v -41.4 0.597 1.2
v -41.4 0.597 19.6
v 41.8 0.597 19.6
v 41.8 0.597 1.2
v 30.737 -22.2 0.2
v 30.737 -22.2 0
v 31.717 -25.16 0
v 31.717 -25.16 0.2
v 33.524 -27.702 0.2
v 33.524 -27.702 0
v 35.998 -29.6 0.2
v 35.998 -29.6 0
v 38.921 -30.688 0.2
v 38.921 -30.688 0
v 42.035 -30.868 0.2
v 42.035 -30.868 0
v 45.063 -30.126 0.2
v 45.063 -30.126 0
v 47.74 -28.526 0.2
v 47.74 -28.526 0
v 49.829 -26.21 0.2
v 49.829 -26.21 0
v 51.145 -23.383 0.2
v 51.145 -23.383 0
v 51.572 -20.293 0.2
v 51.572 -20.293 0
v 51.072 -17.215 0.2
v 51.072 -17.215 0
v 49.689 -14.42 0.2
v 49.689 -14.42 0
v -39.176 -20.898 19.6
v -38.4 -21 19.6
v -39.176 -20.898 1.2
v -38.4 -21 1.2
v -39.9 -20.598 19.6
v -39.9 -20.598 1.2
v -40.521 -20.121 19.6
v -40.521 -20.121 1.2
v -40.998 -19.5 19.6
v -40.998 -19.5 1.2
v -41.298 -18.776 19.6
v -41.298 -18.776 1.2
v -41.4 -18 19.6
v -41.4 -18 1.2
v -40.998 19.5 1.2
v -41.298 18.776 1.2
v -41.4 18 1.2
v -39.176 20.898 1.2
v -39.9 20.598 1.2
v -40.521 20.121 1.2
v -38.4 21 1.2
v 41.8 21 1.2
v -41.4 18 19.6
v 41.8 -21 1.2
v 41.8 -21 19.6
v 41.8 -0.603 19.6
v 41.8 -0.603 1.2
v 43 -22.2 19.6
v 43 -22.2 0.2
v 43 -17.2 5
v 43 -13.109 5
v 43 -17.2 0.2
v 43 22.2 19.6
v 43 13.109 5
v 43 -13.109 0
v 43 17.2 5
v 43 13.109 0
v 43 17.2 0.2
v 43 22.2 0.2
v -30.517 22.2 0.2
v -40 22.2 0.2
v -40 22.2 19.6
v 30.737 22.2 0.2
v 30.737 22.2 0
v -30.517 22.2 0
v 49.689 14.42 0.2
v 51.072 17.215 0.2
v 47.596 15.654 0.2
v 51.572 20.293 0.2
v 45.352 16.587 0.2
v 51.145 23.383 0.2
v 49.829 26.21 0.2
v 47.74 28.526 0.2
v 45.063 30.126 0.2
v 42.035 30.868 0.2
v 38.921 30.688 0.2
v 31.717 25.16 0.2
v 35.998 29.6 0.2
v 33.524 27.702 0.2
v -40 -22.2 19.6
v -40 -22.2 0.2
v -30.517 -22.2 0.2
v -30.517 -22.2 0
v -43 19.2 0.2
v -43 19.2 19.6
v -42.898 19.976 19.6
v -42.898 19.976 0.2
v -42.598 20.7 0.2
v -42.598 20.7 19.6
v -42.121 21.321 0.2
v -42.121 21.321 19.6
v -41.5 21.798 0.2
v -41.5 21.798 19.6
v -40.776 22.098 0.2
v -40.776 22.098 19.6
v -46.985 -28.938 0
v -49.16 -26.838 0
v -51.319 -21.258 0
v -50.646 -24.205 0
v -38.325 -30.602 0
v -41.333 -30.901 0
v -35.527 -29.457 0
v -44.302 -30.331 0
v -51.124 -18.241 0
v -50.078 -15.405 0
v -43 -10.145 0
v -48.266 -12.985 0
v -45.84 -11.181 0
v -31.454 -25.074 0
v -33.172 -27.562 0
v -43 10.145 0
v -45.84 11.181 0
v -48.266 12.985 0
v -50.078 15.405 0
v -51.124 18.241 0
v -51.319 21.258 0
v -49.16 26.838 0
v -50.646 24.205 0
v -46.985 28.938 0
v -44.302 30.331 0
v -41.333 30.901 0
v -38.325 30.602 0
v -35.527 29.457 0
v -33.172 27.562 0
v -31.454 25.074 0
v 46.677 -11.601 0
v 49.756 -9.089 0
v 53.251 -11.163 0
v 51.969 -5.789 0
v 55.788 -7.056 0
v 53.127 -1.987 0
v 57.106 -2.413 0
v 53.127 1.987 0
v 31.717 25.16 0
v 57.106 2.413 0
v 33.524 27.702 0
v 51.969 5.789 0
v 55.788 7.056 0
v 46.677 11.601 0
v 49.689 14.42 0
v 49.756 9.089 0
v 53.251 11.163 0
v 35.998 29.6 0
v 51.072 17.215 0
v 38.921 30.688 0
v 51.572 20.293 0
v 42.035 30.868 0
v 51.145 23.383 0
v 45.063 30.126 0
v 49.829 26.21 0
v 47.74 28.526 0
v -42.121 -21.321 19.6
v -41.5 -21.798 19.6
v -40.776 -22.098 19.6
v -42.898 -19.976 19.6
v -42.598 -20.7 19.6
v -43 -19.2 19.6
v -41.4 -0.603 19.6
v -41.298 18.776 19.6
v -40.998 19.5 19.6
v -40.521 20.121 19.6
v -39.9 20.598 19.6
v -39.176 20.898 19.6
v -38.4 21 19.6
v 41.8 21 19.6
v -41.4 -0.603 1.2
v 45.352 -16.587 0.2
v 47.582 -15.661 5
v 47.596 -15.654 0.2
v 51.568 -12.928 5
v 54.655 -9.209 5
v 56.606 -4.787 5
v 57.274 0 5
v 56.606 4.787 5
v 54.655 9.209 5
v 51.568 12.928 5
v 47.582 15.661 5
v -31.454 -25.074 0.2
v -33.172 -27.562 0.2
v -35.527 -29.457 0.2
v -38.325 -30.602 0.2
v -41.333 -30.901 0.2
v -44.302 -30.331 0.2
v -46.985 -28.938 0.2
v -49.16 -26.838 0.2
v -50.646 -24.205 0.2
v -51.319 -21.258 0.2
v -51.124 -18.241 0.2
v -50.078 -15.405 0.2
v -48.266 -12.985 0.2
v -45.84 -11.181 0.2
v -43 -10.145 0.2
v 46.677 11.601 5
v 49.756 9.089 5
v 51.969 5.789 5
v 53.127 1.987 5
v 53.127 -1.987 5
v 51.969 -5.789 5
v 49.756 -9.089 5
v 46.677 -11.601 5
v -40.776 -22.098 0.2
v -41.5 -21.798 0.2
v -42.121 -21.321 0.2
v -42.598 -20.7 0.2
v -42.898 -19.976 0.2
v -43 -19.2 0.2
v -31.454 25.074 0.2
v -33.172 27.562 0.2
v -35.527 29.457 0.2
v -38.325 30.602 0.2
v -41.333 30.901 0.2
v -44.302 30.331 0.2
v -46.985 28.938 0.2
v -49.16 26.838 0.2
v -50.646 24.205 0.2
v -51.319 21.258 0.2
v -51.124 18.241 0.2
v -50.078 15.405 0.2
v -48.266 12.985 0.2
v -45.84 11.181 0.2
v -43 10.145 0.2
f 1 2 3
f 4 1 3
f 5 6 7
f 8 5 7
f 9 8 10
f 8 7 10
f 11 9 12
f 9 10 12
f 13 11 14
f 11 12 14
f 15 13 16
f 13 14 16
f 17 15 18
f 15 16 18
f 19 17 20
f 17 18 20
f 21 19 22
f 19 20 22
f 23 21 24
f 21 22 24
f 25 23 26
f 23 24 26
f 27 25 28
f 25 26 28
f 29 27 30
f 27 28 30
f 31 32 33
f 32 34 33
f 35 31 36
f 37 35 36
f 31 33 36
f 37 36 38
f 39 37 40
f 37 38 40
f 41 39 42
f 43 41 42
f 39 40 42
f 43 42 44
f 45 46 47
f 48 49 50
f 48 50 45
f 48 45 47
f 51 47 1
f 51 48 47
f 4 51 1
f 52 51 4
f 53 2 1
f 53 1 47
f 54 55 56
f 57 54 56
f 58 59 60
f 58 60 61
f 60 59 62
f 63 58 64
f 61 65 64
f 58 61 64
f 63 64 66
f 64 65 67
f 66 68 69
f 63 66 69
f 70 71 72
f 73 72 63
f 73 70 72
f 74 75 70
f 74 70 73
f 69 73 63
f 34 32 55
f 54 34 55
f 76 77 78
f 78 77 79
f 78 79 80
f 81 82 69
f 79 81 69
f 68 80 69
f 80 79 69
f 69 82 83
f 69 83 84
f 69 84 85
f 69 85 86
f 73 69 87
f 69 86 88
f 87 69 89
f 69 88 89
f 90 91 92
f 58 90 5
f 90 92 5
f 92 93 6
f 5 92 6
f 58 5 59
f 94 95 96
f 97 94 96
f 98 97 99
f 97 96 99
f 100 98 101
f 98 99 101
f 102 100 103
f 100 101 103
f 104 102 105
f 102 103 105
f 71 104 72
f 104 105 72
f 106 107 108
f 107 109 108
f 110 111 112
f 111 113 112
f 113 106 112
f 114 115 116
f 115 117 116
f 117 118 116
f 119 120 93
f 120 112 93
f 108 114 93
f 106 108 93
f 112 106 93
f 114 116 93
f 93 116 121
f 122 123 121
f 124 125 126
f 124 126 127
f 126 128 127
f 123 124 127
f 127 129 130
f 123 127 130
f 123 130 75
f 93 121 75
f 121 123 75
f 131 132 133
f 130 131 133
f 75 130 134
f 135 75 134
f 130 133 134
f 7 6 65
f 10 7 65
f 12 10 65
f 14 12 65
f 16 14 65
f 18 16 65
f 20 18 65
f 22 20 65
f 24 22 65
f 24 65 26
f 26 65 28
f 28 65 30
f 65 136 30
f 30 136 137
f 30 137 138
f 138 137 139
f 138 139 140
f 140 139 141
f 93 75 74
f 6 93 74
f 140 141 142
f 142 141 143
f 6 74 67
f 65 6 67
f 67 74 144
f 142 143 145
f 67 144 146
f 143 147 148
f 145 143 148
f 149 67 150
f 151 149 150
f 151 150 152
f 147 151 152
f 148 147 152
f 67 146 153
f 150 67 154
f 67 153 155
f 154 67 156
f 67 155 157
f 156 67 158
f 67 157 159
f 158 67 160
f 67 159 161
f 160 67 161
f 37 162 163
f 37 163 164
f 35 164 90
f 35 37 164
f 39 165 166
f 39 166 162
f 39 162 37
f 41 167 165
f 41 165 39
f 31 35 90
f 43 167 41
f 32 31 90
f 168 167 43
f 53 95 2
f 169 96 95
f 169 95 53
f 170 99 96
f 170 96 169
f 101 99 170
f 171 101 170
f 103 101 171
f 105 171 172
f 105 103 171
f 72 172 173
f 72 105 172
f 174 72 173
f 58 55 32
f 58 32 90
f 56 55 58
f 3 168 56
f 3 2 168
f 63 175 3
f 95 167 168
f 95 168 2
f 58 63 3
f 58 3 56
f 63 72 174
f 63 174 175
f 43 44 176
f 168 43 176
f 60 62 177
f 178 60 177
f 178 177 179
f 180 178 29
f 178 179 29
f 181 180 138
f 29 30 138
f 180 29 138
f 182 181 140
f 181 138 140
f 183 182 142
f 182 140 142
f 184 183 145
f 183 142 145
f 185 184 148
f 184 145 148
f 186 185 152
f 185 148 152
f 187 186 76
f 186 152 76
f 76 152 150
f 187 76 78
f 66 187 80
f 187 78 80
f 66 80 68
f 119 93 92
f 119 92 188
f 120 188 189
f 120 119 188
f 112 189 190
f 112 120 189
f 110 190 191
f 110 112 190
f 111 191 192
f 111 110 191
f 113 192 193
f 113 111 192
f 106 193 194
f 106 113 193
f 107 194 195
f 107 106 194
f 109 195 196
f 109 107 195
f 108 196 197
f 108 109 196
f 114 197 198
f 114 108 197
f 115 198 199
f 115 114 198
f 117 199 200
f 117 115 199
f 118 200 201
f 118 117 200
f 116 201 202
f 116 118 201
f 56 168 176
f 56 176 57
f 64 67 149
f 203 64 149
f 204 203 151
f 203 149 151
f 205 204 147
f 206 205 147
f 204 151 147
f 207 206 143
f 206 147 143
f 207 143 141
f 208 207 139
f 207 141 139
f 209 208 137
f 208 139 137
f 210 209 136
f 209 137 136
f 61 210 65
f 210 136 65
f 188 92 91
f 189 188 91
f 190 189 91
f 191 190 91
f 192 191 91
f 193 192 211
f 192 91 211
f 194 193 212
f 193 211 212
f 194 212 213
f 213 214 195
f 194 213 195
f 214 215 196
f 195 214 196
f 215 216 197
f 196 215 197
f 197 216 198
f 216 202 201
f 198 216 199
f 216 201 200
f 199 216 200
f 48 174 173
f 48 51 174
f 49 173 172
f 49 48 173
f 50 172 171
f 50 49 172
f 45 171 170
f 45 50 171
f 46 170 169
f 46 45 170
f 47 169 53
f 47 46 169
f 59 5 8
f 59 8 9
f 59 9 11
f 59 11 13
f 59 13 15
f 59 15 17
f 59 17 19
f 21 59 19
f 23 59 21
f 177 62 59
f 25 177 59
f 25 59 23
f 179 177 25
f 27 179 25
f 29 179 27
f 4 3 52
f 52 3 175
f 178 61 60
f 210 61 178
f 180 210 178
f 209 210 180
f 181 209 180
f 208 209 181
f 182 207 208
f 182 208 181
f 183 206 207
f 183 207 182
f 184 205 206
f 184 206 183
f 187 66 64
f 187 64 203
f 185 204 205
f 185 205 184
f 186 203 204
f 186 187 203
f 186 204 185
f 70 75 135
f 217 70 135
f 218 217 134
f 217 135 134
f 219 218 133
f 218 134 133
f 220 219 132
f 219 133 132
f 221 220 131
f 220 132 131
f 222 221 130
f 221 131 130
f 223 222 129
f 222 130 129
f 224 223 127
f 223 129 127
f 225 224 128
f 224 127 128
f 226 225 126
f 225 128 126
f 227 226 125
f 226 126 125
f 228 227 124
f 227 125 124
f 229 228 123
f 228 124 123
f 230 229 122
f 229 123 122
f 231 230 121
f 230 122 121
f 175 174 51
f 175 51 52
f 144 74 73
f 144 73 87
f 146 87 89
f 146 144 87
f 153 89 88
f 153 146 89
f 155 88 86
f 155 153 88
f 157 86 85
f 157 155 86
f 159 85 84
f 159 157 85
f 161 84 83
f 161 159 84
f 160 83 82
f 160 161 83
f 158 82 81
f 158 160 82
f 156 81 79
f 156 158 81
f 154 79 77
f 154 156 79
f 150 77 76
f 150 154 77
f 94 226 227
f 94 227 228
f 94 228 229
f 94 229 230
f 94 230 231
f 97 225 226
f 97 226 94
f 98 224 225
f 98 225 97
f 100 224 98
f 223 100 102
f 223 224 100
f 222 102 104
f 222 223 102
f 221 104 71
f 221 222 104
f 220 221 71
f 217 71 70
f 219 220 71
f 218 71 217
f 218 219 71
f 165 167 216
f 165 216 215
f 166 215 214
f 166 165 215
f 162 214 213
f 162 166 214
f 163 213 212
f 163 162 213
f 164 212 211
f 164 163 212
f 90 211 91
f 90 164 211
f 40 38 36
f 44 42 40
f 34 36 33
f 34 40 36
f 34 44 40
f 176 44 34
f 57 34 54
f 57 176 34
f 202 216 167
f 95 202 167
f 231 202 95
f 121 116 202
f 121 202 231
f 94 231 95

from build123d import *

# Parameters (mm, degrees)
SKETCH_1_W          = 86
SKETCH_1_H          = 44.4
EXTRUDE_1_DEPTH     = 19.6
EXTRUDE_2_DEPTH     = 5
SKETCH_3_W          = 83.2
SKETCH_3_H          = 20.402884615
SKETCH_3_H_2        = 20.397115385
CUT_EXTRUDE_1_DEPTH = 18.4
FILLET_1_R          = 3
EXTRUDE_3_DEPTH     = 0.2


with BuildPart() as part:
    # Эскиз1 → Бобышка-Вытянуть1 (new body)
    with BuildSketch(Plane.XY):
        Rectangle(SKETCH_1_W, SKETCH_1_H)
    extrude(amount=EXTRUDE_1_DEPTH)

    # Эскиз2 → Бобышка-Вытянуть2 (add)
    with BuildSketch(Plane.XY):
        with BuildLine():
            Line((43, 17.2), (43, 13.108775687))
            ThreePointArc((43, 13.108775687), (53.273546839, 0), (43, -13.108775687))
            Line((43, -13.108775687), (43, -17.2))
            ThreePointArc((43, -17.2), (57.273546839, 0), (43, 17.2))
        make_face()
    extrude(amount=EXTRUDE_2_DEPTH)

    # Эскиз3 → Вырез-Вытянуть1 (cut)
    with BuildSketch(Plane.XY.offset(19.6)):
        with Locations((0.2, 10.798557692)):
            Rectangle(SKETCH_3_W, SKETCH_3_H)
        with Locations((0.2, -10.801442308)):
            Rectangle(SKETCH_3_W, SKETCH_3_H_2)
    extrude(amount=-CUT_EXTRUDE_1_DEPTH, mode=Mode.SUBTRACT)

    # Скругление1
    fillet_1_edges = [part.edges().sort_by_distance(p)[0] for p in [
        (-41.4, 21, 10.4),
        (-41.4, -21, 10.4),
        (-43, -22.2, 9.8),
        (-43, 22.2, 9.8),
    ]]
    fillet(fillet_1_edges, radius=FILLET_1_R)

    # Эскиз4 → Бобышка-Вытянуть3 (add)
    with BuildSketch(Plane(origin=(0, 0, 0), x_dir=(-1, 0, 0), z_dir=(0, 0, -1))):
        with BuildLine():
            Line((-49.68910779, 14.419835333), (-30.736733343, 22.2))
            ThreePointArc((-30.736733343, 22.2), (-45.063461681, 30.125769311), (-49.68910779, 14.419835333))
        make_face()
        with BuildLine():
            Line((43, 10.144768059), (30.517095223, 22.2))
            ThreePointArc((30.517095223, 22.2), (48.148575221, 27.966485606), (43, 10.144768059))
        make_face()
        with BuildLine():
            Line((43, -10.144768059), (30.517095223, -22.2))
            ThreePointArc((30.517095223, -22.2), (48.148575221, -27.966485606), (43, -10.144768059))
        make_face()
        with BuildLine():
            Line((-49.68910779, -14.419835333), (-30.736733343, -22.2))
            ThreePointArc((-30.736733343, -22.2), (-45.063461681, -30.125769311), (-49.68910779, -14.419835333))
        make_face()
    extrude(amount=-EXTRUDE_3_DEPTH)


solid = part.part
